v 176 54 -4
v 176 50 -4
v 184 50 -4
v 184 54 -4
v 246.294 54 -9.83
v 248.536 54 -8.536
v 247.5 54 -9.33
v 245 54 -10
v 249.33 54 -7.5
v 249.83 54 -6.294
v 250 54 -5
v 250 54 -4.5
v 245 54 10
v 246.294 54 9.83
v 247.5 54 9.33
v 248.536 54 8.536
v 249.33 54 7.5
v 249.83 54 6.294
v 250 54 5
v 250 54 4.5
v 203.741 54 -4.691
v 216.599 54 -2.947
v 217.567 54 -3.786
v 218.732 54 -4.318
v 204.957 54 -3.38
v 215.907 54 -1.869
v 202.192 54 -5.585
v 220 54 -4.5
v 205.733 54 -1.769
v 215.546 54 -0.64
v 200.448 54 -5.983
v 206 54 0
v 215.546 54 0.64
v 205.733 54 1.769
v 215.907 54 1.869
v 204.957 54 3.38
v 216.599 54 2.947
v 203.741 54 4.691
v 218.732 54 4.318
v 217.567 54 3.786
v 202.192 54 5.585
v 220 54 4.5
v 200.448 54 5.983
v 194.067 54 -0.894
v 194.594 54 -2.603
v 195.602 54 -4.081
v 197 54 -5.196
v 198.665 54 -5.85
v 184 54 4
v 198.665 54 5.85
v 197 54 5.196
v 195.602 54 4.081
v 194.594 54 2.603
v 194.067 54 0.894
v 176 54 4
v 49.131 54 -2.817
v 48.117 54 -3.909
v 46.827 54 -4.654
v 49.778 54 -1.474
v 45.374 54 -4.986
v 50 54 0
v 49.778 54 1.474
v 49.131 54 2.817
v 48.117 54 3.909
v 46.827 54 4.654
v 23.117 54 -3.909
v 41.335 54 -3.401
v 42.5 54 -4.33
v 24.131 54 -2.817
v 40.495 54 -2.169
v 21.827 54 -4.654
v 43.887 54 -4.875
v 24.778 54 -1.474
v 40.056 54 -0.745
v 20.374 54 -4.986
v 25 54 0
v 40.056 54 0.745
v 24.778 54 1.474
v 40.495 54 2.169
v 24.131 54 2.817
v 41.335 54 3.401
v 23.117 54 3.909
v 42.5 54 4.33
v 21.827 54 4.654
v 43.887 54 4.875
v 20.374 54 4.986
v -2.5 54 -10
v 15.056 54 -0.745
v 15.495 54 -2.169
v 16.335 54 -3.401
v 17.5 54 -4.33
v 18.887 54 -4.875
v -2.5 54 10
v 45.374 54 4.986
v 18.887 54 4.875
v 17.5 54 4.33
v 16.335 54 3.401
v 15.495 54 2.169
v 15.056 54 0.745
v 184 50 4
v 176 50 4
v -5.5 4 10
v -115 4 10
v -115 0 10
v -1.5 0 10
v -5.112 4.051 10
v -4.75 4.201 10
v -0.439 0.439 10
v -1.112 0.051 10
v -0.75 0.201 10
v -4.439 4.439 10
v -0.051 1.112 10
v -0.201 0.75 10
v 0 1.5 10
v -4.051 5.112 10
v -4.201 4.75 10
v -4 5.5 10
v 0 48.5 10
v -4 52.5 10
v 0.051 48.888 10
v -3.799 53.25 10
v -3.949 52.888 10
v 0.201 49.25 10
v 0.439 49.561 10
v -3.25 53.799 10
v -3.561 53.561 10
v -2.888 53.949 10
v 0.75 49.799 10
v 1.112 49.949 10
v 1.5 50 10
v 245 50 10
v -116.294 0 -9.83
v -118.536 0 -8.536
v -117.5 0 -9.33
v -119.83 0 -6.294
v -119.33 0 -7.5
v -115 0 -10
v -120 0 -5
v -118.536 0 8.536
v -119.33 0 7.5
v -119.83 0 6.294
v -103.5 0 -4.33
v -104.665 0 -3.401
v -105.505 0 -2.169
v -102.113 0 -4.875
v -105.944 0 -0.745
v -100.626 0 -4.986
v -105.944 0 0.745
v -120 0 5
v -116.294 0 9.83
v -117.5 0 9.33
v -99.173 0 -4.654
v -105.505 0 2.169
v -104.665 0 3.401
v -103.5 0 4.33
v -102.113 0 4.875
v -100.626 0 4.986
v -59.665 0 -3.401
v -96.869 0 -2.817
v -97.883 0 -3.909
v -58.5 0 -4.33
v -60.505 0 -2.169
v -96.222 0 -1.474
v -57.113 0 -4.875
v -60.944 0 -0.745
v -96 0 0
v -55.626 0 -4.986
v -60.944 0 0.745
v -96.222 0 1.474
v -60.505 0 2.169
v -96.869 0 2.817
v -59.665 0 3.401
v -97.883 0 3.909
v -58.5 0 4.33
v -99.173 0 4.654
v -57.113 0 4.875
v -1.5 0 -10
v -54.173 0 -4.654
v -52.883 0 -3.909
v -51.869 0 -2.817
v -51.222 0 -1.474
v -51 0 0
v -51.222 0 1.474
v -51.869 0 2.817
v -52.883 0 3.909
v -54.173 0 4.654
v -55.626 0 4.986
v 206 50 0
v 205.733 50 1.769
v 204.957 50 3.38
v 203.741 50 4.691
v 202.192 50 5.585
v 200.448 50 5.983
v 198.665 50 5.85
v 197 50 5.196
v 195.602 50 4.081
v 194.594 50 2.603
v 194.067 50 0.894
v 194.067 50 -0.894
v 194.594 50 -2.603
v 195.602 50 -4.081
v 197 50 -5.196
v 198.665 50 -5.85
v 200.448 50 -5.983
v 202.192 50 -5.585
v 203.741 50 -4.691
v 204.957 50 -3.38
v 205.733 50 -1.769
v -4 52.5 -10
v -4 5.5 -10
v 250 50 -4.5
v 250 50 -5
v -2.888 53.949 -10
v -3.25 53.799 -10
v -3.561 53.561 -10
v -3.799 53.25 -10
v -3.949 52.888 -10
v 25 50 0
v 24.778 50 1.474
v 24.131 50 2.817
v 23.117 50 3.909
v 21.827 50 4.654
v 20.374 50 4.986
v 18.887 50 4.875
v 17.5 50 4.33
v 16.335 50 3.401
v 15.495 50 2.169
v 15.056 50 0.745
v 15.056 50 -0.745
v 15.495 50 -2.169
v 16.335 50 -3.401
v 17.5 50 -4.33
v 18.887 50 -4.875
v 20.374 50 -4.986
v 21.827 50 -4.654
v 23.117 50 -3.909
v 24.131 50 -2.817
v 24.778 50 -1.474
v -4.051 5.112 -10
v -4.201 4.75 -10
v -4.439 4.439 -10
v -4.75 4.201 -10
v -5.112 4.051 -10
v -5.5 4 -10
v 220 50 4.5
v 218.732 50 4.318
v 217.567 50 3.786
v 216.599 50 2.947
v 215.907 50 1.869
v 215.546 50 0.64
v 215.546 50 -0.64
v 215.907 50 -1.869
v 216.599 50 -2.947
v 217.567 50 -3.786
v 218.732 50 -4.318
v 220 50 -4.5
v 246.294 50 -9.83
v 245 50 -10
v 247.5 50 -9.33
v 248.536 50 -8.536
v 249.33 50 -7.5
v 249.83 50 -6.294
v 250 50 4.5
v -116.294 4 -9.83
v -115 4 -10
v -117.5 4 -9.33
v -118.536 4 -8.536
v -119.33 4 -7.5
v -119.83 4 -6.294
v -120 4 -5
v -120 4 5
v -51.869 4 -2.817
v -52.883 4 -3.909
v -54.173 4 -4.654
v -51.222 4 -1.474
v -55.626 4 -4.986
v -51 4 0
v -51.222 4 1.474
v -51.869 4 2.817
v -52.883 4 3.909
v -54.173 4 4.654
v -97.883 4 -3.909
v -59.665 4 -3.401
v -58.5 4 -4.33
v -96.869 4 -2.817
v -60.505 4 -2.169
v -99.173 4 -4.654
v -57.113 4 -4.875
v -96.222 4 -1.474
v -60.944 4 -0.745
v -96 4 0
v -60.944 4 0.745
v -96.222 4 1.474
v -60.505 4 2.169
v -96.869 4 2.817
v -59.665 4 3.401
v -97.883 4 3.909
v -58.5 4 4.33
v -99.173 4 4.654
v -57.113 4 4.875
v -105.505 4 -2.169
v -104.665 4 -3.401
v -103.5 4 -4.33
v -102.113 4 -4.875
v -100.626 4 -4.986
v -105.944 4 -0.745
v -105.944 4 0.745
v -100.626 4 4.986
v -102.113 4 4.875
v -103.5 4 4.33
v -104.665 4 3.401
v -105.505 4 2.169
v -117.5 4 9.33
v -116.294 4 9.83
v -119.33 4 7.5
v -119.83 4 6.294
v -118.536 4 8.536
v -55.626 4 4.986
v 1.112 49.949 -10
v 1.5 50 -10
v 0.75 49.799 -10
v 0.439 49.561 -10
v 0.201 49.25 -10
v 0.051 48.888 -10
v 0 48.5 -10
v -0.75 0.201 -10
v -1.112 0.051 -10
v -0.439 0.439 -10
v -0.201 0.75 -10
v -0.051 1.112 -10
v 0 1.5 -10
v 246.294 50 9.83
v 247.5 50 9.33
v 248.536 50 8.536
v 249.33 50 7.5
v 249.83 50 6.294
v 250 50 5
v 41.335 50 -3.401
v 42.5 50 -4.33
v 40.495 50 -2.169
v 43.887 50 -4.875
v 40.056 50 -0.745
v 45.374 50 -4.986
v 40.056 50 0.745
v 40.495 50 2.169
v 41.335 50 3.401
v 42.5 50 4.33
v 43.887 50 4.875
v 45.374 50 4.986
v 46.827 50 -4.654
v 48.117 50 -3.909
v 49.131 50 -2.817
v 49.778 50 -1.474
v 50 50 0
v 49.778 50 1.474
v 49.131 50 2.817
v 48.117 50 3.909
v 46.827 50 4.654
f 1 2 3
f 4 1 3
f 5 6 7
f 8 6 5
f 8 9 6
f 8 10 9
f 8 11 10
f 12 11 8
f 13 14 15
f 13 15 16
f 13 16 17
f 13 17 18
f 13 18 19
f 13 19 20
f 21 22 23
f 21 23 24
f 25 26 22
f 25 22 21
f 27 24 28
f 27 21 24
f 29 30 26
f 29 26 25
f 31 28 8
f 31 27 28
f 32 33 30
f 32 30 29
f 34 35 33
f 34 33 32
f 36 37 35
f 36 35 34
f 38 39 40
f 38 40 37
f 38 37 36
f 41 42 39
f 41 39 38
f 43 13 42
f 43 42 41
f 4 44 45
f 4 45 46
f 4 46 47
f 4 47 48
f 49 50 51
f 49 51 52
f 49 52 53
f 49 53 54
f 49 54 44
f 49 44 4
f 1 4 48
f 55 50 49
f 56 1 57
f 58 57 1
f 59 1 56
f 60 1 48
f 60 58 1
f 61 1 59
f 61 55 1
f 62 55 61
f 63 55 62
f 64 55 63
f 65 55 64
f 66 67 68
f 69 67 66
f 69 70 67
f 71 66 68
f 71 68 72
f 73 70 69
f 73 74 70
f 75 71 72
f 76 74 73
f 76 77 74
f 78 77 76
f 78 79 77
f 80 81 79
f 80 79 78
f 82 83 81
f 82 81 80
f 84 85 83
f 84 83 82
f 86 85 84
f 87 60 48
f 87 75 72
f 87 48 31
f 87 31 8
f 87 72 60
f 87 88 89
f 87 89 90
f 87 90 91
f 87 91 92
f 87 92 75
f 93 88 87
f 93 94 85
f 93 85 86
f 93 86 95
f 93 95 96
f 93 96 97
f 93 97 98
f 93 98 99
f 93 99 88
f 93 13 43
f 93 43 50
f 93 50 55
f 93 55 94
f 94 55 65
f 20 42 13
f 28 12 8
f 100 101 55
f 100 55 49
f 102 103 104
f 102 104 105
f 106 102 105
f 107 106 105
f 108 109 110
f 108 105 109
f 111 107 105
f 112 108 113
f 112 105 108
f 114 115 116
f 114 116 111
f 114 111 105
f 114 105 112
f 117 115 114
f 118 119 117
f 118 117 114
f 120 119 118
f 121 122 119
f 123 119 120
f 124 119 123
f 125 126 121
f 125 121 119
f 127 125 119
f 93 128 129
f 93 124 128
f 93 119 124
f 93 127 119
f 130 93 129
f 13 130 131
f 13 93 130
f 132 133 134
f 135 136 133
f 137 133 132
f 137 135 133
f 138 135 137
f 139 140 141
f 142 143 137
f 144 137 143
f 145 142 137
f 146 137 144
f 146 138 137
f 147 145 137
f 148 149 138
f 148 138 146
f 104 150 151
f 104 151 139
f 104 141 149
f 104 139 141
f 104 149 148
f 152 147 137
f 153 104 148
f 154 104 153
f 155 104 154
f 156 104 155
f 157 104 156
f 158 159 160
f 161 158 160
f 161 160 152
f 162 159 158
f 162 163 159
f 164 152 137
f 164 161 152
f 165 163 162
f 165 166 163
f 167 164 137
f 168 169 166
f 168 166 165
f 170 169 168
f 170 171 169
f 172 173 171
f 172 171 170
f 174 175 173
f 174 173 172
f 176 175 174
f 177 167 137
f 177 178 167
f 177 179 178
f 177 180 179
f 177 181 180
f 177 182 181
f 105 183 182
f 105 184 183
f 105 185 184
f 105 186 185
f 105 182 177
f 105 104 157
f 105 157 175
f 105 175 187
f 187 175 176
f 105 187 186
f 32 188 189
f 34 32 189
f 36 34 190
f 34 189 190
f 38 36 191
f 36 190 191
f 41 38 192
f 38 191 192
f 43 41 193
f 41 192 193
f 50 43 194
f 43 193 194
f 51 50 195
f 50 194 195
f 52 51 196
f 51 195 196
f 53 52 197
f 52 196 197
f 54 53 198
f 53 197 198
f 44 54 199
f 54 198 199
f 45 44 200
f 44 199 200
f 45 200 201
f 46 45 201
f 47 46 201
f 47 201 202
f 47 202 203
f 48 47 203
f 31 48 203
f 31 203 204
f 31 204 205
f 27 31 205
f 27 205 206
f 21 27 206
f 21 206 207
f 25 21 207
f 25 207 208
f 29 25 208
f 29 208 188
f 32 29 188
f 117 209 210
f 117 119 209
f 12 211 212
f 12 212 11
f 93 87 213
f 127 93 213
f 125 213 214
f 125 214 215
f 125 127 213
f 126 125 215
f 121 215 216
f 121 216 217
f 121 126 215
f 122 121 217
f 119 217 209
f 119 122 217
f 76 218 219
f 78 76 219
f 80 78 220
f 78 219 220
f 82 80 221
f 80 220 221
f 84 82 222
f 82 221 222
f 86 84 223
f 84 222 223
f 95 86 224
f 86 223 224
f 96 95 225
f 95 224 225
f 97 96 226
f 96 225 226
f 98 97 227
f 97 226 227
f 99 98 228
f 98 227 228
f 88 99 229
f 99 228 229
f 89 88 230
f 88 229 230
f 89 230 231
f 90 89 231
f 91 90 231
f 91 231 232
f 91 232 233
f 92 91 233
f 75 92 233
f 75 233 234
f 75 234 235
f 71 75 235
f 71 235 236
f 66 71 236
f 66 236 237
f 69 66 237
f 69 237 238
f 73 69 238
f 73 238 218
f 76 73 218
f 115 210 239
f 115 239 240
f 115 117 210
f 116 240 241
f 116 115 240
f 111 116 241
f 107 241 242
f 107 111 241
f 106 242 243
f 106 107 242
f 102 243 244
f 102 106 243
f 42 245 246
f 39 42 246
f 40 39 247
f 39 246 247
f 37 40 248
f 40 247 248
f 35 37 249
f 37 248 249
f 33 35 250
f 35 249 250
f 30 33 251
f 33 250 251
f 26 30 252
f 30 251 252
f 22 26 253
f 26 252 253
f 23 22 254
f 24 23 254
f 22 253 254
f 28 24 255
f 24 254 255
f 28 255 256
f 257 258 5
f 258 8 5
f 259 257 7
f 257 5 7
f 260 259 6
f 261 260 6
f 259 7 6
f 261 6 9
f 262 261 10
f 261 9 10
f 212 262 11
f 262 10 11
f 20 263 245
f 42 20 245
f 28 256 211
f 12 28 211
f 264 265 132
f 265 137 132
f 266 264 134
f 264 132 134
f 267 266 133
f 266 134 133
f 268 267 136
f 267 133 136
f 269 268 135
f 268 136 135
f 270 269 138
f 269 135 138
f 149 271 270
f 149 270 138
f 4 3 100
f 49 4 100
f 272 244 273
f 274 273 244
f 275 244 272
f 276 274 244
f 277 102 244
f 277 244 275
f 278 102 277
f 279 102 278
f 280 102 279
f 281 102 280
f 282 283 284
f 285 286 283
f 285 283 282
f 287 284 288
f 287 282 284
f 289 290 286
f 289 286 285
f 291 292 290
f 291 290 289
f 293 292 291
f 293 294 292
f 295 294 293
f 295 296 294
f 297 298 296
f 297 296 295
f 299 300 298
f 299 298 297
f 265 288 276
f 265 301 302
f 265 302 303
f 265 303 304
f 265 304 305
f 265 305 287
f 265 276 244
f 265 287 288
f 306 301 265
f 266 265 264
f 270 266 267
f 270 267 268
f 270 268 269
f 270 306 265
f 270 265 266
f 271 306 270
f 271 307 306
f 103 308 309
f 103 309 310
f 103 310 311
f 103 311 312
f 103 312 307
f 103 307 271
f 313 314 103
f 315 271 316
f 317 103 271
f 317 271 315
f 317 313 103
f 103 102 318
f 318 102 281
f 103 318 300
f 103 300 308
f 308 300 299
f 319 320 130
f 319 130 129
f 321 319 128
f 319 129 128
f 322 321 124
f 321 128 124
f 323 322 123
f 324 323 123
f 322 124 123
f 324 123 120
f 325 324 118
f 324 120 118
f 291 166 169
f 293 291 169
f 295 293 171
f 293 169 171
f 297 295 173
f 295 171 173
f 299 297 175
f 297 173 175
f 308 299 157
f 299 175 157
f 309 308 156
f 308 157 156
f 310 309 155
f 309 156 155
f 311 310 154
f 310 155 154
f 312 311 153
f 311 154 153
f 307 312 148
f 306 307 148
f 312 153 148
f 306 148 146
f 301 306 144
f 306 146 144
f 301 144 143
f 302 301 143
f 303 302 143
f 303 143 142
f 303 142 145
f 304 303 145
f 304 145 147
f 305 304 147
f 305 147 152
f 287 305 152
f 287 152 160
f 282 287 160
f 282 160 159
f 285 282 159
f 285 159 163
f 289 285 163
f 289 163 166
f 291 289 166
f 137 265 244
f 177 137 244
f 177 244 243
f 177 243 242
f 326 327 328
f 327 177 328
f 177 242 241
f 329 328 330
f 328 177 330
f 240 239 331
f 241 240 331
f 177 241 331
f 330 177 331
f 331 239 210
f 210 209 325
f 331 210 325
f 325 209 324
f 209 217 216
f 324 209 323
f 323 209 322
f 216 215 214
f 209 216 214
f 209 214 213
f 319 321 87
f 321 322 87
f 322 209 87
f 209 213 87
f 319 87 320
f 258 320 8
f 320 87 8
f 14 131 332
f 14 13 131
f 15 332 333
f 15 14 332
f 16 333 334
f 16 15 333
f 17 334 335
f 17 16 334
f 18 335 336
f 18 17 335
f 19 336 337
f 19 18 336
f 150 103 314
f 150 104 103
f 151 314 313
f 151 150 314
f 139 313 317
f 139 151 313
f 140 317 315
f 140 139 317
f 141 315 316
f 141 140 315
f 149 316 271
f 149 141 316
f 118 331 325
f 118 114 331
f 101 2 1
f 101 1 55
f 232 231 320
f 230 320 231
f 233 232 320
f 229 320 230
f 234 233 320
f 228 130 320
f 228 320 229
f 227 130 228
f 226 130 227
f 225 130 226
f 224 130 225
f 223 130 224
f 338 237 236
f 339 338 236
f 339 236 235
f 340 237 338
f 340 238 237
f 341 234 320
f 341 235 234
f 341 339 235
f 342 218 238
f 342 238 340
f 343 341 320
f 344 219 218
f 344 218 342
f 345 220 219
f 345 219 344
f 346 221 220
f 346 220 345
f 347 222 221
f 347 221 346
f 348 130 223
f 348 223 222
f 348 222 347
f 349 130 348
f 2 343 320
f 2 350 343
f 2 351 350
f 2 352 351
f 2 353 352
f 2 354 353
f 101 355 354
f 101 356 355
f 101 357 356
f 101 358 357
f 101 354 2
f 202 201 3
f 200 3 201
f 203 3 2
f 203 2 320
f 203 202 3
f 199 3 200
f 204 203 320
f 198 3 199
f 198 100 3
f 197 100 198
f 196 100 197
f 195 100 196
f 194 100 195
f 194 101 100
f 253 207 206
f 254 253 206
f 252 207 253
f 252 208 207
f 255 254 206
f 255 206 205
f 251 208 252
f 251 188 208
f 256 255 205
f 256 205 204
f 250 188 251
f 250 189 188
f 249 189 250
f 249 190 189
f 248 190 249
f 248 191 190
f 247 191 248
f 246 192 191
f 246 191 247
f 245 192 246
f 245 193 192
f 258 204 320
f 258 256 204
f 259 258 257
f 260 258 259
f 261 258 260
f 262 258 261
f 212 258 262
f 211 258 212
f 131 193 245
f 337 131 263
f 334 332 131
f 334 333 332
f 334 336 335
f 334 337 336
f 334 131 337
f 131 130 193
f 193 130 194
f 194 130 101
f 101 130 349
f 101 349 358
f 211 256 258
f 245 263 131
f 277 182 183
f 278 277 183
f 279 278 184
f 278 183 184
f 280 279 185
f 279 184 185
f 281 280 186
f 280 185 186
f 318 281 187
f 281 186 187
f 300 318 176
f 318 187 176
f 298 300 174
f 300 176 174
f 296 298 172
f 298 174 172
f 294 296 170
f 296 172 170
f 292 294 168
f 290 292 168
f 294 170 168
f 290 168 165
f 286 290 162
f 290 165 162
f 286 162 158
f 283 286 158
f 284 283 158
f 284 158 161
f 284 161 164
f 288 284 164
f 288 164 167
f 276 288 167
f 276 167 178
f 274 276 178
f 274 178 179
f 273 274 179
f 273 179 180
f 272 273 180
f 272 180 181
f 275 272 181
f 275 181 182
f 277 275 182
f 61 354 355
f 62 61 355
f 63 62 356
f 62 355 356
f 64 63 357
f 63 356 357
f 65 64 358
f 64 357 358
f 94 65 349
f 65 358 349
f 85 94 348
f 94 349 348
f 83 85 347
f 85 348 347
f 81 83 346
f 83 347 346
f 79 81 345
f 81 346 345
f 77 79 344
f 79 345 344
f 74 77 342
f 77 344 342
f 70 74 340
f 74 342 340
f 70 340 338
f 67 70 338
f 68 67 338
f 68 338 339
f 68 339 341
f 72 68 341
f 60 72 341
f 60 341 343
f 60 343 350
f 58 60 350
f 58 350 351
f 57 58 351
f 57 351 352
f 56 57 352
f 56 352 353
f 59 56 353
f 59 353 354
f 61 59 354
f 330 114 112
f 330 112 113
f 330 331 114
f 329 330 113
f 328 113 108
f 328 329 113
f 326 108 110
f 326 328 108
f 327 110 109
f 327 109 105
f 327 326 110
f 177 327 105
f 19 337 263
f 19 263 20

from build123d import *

# Parameters (mm, degrees)
F2_DEPTH = 10
F3_R     = 5
F3_R_2   = 6
F3_W     = 8
F3_H     = 8
F4_DEPTH = 54.001
F5_R     = 5
F6_R     = 1.5


with BuildPart() as f2:
    # F1 (on Top) → F2 (new body, symmetric)
    with BuildSketch(Plane.XY):
        Polygon((0, 0), (0, 50), (250, 50), (250, 54), (-4, 54), (-4, 4), (-120, 4), (-120, 0), align=None)
    extrude(amount=F2_DEPTH, both=True)

    # F3 (on Front) → F4 (cut, through all)
    with BuildSketch(Plane.XZ):
        with Locations((-101, 0)):
            Circle(F3_R)
        with Locations((-56, 0)):
            Circle(F3_R)
        with Locations((20, 0)):
            Circle(F3_R)
        with Locations((45, 0)):
            Circle(F3_R)
        with Locations((200, 0)):
            Circle(F3_R_2)
        with BuildLine():
            ThreePointArc((220, -4.5), (223.1819805153, -3.1819805153), (224.5, 0))
            ThreePointArc((224.5, 0), (223.1819805153, 3.1819805153), (220, 4.5))
            ThreePointArc((220, 4.5), (215.5, 0), (220, -4.5))
        make_face()
        with BuildLine():
            ThreePointArc((220, 4.5), (223.1819805153, 3.1819805153), (224.5, 0))
            ThreePointArc((224.5, 0), (223.1819805153, -3.1819805153), (220, -4.5))
            Line((220, -4.5), (250, -4.5))
            Line((250, -4.5), (250, 4.5))
            Line((250, 4.5), (220, 4.5))
        make_face()
        with Locations((180, 0)):
            Rectangle(F3_W, F3_H)
    extrude(amount=-F4_DEPTH, mode=Mode.SUBTRACT)

    # F5
    f5_edges = [f2.edges().sort_by_distance(p)[0] for p in [
        (-120, 2, 10),
        (-120, 2, -10),
        (250, 52, -10),
        (250, 52, 10),
    ]]
    fillet(f5_edges, radius=F5_R)

    # F6
    f6_edges = [f2.edges().sort_by_distance(p)[0] for p in [
        (-4, 54, 0),
        (0, 50, 0),
        (0, 0, 0),
        (-4, 4, 0),
    ]]
    fillet(f6_edges, radius=F6_R)


solid = f2.part
